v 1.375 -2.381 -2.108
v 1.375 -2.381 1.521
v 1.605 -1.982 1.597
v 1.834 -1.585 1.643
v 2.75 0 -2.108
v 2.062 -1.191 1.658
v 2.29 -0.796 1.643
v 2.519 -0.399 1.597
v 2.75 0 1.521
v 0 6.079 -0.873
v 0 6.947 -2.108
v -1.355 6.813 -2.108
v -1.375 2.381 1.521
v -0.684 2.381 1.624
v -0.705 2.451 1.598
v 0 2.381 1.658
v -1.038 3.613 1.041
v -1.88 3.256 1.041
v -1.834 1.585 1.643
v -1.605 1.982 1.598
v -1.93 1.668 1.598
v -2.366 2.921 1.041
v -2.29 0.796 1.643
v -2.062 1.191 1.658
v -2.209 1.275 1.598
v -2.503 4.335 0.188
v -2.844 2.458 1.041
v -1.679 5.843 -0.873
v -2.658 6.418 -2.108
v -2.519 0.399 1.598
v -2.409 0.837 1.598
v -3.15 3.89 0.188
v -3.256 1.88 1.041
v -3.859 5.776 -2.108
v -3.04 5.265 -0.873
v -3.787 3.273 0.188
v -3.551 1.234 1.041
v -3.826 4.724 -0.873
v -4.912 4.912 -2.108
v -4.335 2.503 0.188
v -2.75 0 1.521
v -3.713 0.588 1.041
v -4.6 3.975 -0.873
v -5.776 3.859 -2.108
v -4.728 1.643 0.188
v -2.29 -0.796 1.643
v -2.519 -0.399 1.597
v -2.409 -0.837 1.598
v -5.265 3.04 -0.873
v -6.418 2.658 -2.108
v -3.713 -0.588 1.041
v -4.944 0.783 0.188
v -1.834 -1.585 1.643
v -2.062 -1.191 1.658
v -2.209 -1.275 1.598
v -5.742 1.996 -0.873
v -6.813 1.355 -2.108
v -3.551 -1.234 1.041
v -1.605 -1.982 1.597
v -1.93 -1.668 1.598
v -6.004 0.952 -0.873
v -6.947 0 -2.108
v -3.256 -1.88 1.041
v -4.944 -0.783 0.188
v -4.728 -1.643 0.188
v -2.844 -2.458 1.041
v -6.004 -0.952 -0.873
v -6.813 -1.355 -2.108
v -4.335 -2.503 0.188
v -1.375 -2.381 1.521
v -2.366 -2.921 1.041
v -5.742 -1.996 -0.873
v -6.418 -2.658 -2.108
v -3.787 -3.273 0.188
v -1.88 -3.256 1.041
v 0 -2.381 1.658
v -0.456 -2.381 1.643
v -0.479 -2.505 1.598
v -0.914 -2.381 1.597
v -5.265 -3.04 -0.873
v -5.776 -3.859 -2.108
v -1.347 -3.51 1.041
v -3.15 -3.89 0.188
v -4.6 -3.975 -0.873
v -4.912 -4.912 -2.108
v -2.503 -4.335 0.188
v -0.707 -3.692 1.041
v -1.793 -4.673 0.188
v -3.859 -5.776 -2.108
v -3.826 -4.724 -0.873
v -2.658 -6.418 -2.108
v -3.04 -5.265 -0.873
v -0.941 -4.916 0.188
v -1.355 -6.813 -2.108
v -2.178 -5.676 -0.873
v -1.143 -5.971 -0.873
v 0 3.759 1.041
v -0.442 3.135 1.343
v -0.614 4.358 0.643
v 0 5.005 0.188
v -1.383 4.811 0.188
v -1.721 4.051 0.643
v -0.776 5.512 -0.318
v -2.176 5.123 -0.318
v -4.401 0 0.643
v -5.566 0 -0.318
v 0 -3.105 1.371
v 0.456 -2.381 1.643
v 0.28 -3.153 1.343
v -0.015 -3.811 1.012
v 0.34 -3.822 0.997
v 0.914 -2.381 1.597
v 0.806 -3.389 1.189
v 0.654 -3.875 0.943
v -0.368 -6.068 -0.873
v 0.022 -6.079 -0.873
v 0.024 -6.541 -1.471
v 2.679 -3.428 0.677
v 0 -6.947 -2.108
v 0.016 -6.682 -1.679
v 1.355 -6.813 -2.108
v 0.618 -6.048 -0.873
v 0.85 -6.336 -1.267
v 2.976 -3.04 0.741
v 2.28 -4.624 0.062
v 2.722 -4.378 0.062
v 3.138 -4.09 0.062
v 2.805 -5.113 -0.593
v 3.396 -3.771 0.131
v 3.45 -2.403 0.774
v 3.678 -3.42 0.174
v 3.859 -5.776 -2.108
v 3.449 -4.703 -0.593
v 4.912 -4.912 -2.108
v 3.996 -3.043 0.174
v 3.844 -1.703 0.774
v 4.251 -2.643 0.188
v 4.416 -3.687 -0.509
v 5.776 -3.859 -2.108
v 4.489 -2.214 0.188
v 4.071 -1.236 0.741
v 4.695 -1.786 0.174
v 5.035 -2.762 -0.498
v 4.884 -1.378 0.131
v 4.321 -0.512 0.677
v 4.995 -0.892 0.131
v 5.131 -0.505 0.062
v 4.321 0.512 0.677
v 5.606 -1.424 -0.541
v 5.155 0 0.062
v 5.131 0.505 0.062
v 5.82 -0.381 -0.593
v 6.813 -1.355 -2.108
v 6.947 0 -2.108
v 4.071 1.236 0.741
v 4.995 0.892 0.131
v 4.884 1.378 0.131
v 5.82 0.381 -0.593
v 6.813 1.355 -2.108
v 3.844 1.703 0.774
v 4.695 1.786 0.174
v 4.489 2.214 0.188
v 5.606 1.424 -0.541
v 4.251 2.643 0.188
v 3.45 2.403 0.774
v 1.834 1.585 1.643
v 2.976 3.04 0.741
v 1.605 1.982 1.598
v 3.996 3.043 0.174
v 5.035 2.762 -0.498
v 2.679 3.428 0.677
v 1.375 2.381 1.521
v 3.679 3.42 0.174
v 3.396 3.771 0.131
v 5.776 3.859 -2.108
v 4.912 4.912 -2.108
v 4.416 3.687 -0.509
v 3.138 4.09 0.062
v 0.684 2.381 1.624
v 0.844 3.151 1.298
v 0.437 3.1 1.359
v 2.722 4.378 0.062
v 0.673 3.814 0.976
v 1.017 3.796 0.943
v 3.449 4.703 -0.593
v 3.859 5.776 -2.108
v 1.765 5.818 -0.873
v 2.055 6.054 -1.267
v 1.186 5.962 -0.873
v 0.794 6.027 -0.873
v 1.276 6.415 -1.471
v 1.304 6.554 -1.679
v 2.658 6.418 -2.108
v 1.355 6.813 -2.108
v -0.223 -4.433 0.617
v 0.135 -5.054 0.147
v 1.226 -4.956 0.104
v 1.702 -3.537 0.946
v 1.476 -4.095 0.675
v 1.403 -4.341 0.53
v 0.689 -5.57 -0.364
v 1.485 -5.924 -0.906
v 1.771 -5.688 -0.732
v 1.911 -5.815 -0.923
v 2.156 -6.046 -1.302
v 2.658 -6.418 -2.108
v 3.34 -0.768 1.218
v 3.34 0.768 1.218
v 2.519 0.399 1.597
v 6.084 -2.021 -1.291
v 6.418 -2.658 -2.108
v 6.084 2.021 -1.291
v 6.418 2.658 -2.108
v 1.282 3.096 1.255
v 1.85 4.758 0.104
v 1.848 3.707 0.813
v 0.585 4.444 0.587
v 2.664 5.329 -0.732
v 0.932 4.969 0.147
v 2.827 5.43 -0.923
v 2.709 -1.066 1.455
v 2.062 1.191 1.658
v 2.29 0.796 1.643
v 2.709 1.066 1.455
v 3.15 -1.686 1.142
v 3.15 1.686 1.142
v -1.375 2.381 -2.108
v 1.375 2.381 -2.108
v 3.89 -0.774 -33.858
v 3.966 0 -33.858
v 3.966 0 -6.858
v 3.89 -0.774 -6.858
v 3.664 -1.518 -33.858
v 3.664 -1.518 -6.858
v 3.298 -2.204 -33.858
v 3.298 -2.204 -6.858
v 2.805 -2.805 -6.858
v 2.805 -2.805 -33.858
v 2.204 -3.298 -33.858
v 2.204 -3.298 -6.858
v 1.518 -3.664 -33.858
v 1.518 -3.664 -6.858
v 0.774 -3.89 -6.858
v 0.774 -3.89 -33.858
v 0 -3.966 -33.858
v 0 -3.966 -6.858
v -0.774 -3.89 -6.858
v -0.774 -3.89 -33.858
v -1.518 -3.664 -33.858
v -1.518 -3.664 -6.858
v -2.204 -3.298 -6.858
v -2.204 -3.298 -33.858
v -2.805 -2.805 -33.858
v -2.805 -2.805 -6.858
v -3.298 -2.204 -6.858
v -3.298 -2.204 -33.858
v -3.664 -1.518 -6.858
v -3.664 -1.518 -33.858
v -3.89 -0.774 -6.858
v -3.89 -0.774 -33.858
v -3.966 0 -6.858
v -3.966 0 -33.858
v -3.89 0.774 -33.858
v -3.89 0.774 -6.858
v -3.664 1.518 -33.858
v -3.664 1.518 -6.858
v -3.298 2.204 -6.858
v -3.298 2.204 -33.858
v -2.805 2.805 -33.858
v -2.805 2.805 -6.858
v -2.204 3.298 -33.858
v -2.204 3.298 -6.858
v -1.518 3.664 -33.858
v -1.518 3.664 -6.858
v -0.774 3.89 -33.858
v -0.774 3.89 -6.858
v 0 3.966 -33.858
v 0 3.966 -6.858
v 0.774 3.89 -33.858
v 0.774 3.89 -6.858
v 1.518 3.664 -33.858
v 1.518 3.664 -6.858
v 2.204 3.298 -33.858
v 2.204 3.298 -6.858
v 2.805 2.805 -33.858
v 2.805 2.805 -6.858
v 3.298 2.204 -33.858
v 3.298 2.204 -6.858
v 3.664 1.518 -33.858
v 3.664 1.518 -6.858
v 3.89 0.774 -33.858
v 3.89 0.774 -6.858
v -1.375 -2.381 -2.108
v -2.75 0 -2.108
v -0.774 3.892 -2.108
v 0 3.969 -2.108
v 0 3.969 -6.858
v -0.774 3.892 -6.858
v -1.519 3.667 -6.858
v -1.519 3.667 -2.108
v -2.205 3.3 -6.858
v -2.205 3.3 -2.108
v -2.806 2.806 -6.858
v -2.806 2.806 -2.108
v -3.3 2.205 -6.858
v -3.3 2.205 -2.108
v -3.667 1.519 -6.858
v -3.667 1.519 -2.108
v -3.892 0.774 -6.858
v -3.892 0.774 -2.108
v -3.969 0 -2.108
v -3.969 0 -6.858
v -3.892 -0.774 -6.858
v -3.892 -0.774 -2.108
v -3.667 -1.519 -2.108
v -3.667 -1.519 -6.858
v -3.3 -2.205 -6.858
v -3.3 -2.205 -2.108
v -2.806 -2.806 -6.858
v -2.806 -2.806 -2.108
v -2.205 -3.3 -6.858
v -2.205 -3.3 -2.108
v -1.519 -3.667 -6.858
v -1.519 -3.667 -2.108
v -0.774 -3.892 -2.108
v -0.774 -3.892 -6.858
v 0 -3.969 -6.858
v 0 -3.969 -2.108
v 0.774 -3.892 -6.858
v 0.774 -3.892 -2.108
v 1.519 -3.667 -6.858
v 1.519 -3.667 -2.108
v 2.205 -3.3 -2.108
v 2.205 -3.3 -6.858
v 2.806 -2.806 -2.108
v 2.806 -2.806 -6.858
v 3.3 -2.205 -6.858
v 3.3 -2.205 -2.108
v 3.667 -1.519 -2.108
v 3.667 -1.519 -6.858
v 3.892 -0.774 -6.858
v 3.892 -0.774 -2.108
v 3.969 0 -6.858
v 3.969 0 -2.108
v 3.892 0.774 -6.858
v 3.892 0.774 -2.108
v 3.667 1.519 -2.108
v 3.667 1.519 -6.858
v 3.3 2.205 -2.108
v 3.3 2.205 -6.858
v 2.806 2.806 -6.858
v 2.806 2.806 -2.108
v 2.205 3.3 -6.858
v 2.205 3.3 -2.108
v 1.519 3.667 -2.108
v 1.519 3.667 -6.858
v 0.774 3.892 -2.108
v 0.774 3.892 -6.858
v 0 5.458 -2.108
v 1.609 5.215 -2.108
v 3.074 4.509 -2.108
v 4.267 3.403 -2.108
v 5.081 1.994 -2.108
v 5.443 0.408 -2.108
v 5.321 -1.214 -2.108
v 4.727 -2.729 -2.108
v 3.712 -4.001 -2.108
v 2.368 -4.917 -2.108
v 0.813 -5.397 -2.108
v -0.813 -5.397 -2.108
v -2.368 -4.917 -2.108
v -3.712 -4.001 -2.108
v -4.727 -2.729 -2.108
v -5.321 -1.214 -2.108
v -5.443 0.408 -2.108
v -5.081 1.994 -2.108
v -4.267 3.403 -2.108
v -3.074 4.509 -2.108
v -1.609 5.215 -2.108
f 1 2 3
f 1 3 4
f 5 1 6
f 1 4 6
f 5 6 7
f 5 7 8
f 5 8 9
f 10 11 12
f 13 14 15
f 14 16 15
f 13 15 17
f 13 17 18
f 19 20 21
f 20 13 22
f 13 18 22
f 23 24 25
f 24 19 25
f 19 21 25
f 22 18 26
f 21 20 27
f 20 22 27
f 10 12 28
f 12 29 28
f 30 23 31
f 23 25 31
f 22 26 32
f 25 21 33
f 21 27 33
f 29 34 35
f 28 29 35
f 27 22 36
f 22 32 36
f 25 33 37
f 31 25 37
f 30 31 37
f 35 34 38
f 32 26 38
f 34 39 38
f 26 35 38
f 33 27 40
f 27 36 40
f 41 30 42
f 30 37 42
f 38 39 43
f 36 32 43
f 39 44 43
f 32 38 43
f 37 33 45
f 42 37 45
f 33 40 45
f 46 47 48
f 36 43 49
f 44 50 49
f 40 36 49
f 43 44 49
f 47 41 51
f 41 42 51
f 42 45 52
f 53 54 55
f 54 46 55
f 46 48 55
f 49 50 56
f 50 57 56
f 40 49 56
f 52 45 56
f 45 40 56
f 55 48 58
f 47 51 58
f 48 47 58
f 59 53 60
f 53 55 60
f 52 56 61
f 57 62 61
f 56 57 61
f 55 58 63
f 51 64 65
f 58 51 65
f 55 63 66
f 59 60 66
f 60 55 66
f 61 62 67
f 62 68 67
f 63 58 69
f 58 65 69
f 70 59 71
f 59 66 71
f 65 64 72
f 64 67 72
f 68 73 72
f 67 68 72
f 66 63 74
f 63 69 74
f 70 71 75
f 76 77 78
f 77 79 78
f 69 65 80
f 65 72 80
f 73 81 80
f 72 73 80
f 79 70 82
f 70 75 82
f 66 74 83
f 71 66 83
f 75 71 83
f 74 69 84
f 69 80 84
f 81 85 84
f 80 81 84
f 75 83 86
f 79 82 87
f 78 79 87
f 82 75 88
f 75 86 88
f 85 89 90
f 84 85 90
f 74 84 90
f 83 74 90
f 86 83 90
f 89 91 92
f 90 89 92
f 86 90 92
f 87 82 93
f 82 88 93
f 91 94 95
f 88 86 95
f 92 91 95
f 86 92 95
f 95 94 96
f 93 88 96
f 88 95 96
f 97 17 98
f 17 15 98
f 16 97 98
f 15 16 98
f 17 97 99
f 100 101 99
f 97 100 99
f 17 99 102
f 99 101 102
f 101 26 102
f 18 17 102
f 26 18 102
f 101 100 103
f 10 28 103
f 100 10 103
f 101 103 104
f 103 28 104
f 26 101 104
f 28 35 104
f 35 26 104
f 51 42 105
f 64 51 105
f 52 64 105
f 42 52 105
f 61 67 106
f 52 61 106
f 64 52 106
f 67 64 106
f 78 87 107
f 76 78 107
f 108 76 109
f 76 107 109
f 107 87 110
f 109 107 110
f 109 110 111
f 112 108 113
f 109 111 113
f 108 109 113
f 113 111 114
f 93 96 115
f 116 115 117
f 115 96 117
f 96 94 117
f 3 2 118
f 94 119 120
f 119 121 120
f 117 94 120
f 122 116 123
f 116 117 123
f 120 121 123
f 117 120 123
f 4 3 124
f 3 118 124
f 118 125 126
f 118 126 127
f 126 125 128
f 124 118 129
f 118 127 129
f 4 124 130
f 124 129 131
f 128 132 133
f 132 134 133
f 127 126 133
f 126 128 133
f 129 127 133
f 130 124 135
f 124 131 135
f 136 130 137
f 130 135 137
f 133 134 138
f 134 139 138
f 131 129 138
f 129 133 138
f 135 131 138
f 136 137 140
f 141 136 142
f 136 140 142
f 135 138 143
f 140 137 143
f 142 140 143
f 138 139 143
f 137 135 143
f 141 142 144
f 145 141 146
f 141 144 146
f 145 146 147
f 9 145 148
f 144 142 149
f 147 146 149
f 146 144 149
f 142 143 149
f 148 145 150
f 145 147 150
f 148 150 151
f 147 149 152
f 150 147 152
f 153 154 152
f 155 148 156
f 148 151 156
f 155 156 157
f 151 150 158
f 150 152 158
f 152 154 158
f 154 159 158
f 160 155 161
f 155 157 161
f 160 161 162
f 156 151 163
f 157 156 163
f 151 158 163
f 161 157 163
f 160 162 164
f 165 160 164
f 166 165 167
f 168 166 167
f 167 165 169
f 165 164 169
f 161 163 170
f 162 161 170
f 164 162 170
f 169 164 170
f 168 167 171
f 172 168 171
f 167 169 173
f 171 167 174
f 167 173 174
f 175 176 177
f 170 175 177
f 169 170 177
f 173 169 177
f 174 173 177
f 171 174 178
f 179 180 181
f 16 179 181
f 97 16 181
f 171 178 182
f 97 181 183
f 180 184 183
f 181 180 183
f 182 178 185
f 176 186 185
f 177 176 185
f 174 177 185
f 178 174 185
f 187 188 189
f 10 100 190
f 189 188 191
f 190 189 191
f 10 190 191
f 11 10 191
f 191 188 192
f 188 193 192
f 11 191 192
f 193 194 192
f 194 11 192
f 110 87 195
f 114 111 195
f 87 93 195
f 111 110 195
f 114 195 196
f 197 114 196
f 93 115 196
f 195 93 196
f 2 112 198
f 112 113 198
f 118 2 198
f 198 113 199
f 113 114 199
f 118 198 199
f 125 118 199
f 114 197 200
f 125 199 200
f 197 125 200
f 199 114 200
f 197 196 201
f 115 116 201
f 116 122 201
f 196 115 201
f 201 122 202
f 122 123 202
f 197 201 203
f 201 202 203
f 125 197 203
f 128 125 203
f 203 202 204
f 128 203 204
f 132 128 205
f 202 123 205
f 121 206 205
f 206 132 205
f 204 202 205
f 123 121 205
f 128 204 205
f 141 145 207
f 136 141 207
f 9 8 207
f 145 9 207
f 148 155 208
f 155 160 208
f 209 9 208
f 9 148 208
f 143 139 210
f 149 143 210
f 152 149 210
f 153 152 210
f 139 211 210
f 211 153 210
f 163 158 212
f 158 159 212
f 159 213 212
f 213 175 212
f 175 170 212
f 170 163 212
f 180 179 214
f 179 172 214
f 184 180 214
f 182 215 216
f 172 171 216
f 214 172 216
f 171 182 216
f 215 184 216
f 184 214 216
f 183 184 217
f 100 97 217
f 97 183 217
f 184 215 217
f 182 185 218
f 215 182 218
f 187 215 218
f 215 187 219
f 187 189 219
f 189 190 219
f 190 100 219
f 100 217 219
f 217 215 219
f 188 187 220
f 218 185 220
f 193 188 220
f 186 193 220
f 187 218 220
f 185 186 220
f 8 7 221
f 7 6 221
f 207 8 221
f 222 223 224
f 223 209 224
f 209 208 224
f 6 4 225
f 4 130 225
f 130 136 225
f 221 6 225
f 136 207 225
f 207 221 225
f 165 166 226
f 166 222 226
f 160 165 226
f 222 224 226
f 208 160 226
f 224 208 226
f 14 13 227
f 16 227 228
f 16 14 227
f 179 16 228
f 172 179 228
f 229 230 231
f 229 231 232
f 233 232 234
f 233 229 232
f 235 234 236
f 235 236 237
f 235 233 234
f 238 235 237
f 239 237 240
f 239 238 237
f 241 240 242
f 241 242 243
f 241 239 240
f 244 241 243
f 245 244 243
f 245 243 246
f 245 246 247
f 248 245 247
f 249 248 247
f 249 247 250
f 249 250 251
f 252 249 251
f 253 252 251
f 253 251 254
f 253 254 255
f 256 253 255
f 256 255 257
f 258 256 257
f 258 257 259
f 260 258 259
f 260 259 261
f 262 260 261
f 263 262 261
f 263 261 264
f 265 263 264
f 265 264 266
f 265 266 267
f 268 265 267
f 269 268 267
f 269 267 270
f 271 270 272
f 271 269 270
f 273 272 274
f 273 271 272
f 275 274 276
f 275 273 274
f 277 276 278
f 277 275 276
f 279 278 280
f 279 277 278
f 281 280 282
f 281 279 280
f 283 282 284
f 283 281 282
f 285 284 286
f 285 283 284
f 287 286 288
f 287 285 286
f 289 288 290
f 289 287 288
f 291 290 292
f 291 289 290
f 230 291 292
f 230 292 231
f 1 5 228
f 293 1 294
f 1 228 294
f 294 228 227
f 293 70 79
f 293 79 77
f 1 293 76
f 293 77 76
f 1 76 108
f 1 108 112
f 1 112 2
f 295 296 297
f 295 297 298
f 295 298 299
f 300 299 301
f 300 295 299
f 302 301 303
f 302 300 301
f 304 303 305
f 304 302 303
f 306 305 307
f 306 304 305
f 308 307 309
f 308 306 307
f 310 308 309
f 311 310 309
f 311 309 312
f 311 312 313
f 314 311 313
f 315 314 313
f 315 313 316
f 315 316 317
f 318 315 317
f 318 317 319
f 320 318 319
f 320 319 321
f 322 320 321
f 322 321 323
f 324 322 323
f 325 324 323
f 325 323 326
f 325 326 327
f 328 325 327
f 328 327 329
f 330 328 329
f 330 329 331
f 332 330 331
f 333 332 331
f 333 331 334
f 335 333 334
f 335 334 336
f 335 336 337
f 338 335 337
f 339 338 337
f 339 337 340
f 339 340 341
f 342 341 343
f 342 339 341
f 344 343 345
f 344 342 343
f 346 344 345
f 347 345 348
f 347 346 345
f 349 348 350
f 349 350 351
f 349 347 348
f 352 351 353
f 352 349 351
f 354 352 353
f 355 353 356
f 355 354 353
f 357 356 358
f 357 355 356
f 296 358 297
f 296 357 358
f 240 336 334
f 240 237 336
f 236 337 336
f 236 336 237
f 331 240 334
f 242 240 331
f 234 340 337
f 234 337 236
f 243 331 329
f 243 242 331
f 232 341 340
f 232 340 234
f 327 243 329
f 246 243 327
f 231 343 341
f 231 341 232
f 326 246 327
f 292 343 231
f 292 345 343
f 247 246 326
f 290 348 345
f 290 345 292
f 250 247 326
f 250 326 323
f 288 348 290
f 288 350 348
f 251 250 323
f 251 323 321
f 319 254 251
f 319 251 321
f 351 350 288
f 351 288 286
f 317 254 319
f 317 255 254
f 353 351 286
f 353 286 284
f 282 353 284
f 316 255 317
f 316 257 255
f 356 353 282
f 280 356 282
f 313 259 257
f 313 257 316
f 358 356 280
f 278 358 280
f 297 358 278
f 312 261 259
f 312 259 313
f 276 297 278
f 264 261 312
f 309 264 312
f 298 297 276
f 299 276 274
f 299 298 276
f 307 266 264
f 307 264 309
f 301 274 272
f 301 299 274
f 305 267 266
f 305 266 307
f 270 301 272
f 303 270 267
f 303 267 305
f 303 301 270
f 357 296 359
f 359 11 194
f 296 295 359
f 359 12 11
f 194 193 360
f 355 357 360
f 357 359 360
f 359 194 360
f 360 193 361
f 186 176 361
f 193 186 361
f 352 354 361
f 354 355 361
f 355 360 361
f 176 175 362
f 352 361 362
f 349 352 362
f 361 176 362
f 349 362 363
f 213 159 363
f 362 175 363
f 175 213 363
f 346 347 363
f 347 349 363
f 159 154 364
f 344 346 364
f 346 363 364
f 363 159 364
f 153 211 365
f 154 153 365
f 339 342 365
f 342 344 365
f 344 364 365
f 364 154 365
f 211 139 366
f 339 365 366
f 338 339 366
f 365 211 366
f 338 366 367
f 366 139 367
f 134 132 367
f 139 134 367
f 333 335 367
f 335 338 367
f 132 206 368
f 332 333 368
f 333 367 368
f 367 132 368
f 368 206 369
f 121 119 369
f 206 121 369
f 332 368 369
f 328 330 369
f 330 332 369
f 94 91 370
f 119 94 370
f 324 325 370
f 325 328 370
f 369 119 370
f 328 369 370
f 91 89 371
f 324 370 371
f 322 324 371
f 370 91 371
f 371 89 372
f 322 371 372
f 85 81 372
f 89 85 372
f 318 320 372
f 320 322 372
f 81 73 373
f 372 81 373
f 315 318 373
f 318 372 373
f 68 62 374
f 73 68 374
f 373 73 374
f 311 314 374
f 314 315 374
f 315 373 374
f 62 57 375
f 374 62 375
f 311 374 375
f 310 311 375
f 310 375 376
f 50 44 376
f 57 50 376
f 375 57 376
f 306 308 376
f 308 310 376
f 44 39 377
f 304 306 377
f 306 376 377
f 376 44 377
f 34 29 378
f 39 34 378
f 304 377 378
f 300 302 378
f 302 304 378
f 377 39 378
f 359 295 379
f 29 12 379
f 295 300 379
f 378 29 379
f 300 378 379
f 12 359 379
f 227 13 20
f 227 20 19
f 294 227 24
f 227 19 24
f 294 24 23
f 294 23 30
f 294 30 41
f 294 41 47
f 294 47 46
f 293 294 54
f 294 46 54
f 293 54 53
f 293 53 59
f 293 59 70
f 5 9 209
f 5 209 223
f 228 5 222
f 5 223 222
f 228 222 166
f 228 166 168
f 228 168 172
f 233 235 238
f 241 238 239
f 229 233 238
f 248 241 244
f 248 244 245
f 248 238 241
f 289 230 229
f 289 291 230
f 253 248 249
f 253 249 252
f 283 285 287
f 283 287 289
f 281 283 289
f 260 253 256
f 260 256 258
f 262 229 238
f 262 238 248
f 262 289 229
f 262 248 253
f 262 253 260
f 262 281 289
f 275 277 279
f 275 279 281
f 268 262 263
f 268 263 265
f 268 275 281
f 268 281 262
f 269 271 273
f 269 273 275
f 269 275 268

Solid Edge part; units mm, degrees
sketch "Sketch1" plane through (0, 0, 0) normal (1, 0, 0) x (0, 1, 0)
  line L0 (0, -2.1082) -> (0, 2.1082)
  arc A0 (0, 2.1082) -> (6.9469, -2.1082) centre (-0.3606, -6.3169) cw
  line L1 (0, -2.1082) -> (6.9469, -2.1082)
  dimension "D1" = 4.2164
  dimension "D2" = 8.4328
revolve "RevolvedProtrusion1" add sketch "Sketch1" angle 360 about axis through (0, 0, -14.7796) along (0, 0, 1)
sketch "Sketch2" plane through (0, 0, -2.1082) normal (0, 0, -1) x (0, 1, 0)
  circle A0 centre (0, 0) radius 3.9687
  dimension "D1" = 7.9375
extrude "Protrusion1" add sketch "Sketch2" along normal blind 31.75
sketch "Sketch3" plane through (0, 0, -33.8582) normal (0, 0, -1) x (1, 0, 0)
  circle A0 centre (0, 0) radius 3.9662
  dimension "D1" = 0.0025
extrude "Cutout1" cut sketch "Sketch3" against normal blind 27.0002 flip side to cut
sketch "Sketch4" plane through (-0.6032, 0.3606, 4.2164) normal (0, 0, 1) x (1, 0, 0)
  line L0 (-0.7716, 2.0206) -> (1.978, 2.0206)
  line L1 (3.3529, -0.3606) -> (1.978, 2.0206)
  line L2 (1.978, -2.7419) -> (3.3529, -0.3606)
  line L3 (-0.7716, -2.7419) -> (1.978, -2.7419)
  line L4 (-2.1464, -0.3606) -> (-0.7716, -2.7419)
  line L5 (-0.7716, 2.0206) -> (-2.1464, -0.3606)
extrude "ExtrudedCutout_11" cut sketch "Sketch4" against normal blind 6.3246
properties part number "209090"
